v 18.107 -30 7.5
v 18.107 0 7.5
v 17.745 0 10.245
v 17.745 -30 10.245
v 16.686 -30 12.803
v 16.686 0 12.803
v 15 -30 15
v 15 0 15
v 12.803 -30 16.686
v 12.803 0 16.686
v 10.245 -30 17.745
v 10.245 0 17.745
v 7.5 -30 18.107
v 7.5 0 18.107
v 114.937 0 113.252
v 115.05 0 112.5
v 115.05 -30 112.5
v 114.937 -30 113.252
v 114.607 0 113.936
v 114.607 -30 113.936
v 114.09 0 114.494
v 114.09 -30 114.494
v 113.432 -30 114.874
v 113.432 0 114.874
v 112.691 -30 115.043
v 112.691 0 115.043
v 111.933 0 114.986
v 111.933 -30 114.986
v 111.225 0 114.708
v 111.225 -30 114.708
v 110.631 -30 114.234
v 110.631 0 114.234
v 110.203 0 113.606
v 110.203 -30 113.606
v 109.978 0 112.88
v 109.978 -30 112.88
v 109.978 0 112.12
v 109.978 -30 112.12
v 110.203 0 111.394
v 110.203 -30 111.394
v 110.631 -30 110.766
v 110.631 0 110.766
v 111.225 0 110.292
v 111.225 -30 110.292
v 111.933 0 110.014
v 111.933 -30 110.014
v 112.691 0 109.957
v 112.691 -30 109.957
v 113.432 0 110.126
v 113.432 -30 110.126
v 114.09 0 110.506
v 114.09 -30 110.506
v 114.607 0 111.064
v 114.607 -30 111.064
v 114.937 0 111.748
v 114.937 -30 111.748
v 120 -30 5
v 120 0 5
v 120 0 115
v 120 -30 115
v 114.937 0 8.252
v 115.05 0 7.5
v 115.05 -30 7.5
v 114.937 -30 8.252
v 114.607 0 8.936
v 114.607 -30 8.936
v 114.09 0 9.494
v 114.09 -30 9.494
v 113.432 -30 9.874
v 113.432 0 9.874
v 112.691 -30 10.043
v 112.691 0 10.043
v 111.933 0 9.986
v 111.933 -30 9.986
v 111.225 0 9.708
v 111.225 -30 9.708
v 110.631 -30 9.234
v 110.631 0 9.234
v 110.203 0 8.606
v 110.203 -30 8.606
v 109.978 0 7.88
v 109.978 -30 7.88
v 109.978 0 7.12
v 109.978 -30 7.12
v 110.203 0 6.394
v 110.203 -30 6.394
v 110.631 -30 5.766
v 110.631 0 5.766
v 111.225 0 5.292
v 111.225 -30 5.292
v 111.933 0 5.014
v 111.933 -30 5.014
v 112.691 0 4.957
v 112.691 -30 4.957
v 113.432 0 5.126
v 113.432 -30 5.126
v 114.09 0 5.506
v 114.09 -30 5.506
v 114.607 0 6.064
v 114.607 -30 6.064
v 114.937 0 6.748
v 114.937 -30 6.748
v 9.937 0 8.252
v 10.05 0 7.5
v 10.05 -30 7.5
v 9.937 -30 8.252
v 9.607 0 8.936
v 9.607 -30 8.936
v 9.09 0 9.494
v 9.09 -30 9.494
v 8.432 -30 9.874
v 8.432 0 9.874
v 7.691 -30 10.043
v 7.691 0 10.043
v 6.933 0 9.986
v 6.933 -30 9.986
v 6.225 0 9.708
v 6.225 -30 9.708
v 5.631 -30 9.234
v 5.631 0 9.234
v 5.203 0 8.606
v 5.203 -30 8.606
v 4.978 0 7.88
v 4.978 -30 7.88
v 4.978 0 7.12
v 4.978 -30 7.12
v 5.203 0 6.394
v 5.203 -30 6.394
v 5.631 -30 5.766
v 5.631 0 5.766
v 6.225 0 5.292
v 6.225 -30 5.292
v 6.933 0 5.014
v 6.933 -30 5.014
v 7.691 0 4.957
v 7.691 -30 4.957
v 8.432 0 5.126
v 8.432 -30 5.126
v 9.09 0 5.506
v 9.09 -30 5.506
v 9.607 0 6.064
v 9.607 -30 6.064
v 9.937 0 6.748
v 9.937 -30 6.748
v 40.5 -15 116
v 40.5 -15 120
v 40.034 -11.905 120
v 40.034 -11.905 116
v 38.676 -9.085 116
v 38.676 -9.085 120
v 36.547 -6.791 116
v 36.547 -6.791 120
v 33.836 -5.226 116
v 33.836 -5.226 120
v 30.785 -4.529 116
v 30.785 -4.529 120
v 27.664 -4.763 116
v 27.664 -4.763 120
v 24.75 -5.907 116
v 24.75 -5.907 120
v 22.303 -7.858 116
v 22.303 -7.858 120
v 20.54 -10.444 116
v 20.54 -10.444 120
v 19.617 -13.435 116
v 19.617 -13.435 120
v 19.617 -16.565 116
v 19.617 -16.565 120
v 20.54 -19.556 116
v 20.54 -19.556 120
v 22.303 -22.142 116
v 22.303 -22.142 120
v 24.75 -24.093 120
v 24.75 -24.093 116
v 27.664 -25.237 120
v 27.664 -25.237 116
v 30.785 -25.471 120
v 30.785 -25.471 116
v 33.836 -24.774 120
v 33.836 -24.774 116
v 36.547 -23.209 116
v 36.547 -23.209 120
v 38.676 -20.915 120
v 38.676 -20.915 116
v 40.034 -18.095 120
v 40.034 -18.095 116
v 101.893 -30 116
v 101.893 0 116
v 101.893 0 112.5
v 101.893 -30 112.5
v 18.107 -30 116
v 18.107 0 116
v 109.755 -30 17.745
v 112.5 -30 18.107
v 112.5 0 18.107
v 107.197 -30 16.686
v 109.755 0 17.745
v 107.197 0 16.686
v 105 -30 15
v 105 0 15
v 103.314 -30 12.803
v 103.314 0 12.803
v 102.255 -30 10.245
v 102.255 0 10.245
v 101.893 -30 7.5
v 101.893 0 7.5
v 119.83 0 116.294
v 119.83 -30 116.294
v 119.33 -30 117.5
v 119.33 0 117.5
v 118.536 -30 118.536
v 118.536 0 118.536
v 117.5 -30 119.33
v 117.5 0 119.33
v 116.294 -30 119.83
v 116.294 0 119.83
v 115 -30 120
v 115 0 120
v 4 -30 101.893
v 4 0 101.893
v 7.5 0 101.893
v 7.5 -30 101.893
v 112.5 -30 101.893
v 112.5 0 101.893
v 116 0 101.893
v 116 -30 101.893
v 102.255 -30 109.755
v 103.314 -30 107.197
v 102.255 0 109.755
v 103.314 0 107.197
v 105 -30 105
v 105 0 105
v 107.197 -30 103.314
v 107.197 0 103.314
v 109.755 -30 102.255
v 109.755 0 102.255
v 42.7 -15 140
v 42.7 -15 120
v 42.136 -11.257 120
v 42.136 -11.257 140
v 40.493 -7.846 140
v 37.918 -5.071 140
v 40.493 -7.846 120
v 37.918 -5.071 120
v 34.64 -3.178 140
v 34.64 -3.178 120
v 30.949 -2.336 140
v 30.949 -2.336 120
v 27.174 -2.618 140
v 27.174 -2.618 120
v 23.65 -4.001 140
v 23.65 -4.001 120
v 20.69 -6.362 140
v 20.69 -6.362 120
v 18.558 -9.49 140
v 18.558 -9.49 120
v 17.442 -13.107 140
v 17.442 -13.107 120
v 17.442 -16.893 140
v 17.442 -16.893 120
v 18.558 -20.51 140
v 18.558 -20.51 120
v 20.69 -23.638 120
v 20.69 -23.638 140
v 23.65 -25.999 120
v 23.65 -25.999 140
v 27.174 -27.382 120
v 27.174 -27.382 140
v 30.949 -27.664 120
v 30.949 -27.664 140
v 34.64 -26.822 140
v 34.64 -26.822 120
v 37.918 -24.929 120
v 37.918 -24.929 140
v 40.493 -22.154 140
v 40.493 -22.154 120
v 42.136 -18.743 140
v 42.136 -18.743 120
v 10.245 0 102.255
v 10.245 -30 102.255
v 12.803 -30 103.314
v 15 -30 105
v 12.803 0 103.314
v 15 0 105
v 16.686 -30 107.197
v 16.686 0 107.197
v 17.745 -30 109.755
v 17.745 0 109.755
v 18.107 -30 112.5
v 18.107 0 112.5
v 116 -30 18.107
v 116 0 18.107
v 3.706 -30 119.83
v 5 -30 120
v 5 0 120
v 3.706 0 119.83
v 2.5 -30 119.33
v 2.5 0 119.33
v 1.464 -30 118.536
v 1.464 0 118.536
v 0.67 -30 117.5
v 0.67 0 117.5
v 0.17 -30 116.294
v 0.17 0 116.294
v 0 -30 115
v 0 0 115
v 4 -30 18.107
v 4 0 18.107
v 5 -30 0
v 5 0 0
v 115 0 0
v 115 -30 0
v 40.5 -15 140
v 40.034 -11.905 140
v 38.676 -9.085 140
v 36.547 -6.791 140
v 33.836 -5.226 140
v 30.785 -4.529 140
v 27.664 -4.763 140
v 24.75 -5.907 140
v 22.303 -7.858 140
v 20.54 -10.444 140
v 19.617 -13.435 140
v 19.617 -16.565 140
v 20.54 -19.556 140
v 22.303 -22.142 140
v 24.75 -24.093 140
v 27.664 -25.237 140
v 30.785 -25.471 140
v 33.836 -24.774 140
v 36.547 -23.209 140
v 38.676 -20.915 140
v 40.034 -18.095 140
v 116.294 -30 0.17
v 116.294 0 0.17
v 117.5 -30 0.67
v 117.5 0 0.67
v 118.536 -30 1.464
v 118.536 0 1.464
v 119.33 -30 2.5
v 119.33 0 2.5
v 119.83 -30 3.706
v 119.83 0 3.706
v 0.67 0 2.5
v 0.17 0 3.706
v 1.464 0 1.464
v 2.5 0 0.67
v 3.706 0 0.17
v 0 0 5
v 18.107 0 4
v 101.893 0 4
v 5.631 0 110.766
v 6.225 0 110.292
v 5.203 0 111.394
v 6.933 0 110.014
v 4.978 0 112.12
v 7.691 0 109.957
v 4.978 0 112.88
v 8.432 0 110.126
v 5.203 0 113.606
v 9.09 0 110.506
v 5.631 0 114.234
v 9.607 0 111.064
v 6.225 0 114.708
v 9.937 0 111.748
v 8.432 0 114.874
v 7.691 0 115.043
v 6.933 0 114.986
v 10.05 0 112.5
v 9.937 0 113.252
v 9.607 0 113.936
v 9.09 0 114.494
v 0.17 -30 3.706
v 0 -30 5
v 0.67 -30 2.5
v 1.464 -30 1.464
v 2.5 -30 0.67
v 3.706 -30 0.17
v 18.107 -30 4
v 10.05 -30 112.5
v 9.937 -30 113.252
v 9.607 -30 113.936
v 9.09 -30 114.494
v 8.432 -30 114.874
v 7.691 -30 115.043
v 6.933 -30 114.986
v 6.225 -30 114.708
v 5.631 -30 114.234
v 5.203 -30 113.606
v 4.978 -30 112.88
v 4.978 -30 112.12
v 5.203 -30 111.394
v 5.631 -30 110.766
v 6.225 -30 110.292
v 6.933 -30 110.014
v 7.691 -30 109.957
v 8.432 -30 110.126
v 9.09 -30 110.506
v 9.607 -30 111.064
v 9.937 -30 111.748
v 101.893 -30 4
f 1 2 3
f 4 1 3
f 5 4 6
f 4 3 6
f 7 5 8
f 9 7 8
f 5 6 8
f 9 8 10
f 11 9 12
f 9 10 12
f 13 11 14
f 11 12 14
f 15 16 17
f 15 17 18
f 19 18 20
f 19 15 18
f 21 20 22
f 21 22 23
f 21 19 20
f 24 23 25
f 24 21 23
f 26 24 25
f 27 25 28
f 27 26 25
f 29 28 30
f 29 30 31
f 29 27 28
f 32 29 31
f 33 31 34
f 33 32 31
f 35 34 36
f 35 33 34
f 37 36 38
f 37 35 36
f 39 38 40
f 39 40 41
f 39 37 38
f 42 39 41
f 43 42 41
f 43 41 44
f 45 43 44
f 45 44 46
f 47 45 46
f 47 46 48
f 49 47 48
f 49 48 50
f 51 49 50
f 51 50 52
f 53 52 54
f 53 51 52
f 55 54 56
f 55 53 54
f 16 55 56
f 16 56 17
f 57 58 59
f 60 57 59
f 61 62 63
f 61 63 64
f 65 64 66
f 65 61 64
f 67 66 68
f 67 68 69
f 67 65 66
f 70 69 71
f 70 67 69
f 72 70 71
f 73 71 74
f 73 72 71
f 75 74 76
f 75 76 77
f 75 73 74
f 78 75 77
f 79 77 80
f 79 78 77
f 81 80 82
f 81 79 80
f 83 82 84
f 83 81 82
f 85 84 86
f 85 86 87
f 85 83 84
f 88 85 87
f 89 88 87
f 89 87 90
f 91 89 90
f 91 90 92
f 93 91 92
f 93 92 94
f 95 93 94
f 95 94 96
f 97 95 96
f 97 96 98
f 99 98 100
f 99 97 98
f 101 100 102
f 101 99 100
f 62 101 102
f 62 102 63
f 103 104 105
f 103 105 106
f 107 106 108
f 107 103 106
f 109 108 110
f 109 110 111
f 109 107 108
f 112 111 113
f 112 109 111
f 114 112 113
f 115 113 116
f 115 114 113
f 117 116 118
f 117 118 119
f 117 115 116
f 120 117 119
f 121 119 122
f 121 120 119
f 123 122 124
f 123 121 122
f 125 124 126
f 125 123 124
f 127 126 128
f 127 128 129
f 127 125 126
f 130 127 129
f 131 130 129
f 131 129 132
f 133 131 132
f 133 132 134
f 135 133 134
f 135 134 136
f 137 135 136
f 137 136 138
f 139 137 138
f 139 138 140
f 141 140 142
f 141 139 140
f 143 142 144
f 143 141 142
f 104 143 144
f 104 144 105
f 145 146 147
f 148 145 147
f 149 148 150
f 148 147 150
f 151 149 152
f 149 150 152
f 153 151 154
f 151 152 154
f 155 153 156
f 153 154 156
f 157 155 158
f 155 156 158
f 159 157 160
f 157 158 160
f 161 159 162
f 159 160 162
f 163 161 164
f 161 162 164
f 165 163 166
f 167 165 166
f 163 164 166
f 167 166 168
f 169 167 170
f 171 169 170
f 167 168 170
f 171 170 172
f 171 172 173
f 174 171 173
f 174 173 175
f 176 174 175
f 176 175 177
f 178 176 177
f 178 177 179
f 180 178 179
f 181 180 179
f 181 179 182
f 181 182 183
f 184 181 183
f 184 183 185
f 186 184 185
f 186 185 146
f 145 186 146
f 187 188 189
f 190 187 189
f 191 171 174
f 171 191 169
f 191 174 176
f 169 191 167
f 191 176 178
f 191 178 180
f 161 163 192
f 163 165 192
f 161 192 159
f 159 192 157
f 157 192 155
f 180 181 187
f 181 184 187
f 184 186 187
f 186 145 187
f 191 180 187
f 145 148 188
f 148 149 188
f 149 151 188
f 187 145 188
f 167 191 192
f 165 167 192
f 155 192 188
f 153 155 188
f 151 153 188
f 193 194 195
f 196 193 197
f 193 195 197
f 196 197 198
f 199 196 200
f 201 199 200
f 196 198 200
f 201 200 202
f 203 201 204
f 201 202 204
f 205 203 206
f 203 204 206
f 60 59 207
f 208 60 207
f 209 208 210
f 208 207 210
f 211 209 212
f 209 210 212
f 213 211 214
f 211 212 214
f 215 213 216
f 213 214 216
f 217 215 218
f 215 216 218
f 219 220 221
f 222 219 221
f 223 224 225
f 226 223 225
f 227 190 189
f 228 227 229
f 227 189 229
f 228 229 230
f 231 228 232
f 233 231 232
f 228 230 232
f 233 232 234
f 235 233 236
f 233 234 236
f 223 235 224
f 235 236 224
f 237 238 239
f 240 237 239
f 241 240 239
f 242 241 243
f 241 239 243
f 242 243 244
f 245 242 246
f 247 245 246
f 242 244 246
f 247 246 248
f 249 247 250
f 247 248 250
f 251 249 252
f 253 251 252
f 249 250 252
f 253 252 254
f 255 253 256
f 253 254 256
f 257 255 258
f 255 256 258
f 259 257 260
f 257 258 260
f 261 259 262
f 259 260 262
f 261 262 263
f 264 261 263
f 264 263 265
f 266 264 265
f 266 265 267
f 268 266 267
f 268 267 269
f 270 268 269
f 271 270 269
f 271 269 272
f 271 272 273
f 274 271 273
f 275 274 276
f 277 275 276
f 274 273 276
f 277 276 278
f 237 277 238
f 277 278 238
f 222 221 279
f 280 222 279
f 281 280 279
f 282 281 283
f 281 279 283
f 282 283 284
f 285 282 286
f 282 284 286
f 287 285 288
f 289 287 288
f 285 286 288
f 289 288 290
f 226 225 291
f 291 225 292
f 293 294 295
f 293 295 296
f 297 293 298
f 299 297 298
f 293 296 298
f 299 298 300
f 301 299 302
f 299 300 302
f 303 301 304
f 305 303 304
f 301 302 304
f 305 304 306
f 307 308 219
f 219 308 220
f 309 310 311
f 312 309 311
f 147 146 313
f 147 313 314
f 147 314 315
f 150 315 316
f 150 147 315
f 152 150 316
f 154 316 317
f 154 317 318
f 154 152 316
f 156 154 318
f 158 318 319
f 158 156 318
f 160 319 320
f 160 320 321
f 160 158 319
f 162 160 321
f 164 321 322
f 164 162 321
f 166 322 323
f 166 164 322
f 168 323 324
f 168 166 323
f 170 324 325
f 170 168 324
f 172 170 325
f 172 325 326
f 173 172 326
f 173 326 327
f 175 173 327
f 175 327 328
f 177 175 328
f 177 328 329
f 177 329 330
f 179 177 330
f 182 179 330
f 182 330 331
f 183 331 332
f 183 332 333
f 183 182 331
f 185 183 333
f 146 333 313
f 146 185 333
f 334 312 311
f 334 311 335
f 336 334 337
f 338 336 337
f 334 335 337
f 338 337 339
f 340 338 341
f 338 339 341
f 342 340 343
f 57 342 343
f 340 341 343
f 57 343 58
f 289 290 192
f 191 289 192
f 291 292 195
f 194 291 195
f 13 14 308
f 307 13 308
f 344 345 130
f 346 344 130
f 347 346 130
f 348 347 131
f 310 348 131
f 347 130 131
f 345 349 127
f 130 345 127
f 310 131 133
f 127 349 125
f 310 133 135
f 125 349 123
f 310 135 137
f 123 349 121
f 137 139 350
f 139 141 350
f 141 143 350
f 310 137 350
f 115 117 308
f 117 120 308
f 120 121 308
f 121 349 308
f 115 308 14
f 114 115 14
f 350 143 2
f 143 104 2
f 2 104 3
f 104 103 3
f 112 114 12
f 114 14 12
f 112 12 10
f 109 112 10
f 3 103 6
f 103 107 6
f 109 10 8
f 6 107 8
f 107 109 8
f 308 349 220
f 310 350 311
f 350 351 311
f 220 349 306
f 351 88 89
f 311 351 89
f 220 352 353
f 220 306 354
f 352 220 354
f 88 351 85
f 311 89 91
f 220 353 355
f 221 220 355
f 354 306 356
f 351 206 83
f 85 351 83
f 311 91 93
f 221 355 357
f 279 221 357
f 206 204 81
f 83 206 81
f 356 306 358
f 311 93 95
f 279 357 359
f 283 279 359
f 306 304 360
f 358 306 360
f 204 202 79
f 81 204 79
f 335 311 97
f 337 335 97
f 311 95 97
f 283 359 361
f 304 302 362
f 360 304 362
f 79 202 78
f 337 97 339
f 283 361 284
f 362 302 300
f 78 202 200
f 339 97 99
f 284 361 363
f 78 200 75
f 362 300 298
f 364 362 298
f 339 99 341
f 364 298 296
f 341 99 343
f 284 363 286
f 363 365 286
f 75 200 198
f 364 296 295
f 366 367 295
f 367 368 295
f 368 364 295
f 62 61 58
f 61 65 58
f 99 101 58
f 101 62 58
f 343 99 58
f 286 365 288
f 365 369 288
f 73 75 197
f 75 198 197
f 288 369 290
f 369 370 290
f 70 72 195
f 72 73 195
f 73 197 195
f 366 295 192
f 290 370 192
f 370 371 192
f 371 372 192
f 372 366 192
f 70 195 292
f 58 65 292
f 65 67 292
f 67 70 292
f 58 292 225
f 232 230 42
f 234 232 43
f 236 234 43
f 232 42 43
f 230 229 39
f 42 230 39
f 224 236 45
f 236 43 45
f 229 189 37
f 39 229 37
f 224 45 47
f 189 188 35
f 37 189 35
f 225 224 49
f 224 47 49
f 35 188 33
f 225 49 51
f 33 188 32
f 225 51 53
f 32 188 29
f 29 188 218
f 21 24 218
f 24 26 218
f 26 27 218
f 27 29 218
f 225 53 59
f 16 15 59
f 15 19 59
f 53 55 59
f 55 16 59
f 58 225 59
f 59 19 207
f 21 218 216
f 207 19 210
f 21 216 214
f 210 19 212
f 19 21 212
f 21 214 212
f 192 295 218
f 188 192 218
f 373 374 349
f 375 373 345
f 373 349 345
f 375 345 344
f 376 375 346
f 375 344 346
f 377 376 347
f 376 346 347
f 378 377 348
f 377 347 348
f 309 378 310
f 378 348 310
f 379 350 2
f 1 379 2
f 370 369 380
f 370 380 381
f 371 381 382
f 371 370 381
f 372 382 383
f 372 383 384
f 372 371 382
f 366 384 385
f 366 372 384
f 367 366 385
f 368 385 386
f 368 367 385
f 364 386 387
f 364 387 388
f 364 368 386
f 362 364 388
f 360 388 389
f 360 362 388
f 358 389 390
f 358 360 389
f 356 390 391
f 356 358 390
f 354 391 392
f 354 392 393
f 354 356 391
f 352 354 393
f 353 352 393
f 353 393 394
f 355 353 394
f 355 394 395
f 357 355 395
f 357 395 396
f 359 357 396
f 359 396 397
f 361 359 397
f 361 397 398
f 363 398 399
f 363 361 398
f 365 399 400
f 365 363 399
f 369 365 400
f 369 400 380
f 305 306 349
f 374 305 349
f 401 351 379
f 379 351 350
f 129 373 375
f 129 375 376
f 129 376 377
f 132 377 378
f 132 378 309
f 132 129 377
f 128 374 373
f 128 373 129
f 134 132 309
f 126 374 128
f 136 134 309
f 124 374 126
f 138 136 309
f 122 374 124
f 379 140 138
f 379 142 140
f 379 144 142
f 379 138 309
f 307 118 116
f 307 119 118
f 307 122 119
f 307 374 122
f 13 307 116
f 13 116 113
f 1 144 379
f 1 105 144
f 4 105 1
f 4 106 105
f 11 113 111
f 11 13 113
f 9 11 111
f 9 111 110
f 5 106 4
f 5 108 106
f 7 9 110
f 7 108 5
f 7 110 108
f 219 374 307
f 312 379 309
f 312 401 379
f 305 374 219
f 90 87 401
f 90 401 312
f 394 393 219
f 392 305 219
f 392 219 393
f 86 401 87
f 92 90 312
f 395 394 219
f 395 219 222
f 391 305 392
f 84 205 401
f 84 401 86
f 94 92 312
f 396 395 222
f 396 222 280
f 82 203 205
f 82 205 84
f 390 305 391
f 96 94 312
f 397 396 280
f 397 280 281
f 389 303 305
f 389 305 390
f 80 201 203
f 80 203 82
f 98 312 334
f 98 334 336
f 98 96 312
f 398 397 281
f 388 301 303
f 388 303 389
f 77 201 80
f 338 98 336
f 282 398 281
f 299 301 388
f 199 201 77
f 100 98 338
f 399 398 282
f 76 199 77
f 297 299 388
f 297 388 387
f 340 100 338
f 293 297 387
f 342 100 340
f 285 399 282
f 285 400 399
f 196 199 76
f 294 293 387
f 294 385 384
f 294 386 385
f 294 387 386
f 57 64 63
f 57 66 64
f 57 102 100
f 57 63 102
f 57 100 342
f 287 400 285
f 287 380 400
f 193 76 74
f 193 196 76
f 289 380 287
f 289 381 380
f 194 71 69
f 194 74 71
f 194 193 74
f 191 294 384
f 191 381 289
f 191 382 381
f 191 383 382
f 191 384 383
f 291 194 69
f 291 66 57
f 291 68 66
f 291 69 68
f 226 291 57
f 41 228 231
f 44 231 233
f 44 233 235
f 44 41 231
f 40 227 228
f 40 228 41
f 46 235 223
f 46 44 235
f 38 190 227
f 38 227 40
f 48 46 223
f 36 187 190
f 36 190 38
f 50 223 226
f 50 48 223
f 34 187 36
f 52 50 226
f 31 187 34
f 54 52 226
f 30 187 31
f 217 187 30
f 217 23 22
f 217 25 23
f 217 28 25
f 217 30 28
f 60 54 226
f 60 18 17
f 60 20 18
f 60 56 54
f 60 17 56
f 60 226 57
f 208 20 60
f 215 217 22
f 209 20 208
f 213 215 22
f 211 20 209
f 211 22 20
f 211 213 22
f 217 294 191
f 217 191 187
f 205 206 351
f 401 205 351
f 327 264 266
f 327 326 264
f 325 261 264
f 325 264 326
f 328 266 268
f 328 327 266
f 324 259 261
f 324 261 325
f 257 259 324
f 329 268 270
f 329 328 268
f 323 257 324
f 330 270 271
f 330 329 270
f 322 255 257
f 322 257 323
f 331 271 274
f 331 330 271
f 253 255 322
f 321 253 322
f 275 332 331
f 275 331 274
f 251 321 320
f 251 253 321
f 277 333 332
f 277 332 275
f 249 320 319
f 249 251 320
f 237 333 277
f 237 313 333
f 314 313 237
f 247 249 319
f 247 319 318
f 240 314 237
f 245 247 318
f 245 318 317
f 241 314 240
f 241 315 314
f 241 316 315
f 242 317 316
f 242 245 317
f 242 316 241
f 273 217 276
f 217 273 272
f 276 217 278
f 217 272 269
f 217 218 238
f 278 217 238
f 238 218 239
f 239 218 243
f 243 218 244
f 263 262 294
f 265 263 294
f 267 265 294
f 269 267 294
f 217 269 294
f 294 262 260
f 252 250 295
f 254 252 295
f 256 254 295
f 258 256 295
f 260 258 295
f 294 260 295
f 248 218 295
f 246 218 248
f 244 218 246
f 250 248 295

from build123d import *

# Parameters (mm, degrees)
F0_R     = 2.55
F1_DEPTH = 30
F2_R     = 12.7
F2_R_2   = 10.5
F3_DEPTH = 20
F4_DEPTH = 25


with BuildPart() as f1:
    # F0 (on Front) → F1 (new body)
    with BuildSketch(Plane.XZ):
        with BuildLine():
            ThreePointArc((0, 5), (1.4644660941, 1.4644660941), (5, 0))
            Line((5, 0), (115, 0))
            ThreePointArc((115, 0), (118.5355339059, 1.4644660941), (120, 5))
            Line((120, 5), (120, 115))
            ThreePointArc((120, 115), (118.5355339059, 118.5355339059), (115, 120))
            Line((115, 120), (5, 120))
            ThreePointArc((5, 120), (1.4644660941, 118.5355339059), (0, 115))
            Line((0, 115), (0, 5))
        make_face()
        with Locations((7.5, 7.5)):
            Circle(F0_R, mode=Mode.SUBTRACT)
        with Locations((112.5, 7.5)):
            Circle(F0_R, mode=Mode.SUBTRACT)
        with BuildLine():
            Line((4, 101.8933982822), (7.5, 101.8933982822))
            ThreePointArc((7.5, 101.8933982822), (15, 105), (18.1066017178, 112.5))
            Line((18.1066017178, 112.5), (18.1066017178, 116))
            Line((18.1066017178, 116), (101.8933982822, 116))
            Line((101.8933982822, 116), (101.8933982822, 112.5))
            ThreePointArc((101.8933982822, 112.5), (105, 105), (112.5, 101.8933982822))
            Line((112.5, 101.8933982822), (116, 101.8933982822))
            Line((116, 101.8933982822), (116, 18.1066017178))
            Line((116, 18.1066017178), (112.5, 18.1066017178))
            ThreePointArc((112.5, 18.1066017178), (105, 15), (101.8933982822, 7.5))
            Line((101.8933982822, 7.5), (101.8933982822, 4))
            Line((101.8933982822, 4), (18.1066017178, 4))
            Line((18.1066017178, 4), (18.1066017178, 7.5))
            ThreePointArc((18.1066017178, 7.5), (15, 15), (7.5, 18.1066017178))
            Line((7.5, 18.1066017178), (4, 18.1066017178))
            Line((4, 18.1066017178), (4, 101.8933982822))
        make_face(mode=Mode.SUBTRACT)
        with Locations((7.5, 112.5)):
            Circle(F0_R, mode=Mode.SUBTRACT)
        with Locations((112.5, 112.5)):
            Circle(F0_R, mode=Mode.SUBTRACT)
    extrude(amount=F1_DEPTH)

    # F2 (on face) → F3 (join)
    with BuildSketch(Plane.XY.offset(120)):
        with Locations((30, -15)):
            Circle(F2_R)
        with Locations((30, -15)):
            Circle(F2_R_2, mode=Mode.SUBTRACT)
    extrude(amount=F3_DEPTH)

    # F4 (cut): a face of the model
    f4_faces = [f1.faces().sort_by_distance(p)[0] for p in [
        (30, -15, 120),
    ]]
    extrude(f4_faces, amount=-F4_DEPTH, mode=Mode.SUBTRACT)


solid = f1.part
